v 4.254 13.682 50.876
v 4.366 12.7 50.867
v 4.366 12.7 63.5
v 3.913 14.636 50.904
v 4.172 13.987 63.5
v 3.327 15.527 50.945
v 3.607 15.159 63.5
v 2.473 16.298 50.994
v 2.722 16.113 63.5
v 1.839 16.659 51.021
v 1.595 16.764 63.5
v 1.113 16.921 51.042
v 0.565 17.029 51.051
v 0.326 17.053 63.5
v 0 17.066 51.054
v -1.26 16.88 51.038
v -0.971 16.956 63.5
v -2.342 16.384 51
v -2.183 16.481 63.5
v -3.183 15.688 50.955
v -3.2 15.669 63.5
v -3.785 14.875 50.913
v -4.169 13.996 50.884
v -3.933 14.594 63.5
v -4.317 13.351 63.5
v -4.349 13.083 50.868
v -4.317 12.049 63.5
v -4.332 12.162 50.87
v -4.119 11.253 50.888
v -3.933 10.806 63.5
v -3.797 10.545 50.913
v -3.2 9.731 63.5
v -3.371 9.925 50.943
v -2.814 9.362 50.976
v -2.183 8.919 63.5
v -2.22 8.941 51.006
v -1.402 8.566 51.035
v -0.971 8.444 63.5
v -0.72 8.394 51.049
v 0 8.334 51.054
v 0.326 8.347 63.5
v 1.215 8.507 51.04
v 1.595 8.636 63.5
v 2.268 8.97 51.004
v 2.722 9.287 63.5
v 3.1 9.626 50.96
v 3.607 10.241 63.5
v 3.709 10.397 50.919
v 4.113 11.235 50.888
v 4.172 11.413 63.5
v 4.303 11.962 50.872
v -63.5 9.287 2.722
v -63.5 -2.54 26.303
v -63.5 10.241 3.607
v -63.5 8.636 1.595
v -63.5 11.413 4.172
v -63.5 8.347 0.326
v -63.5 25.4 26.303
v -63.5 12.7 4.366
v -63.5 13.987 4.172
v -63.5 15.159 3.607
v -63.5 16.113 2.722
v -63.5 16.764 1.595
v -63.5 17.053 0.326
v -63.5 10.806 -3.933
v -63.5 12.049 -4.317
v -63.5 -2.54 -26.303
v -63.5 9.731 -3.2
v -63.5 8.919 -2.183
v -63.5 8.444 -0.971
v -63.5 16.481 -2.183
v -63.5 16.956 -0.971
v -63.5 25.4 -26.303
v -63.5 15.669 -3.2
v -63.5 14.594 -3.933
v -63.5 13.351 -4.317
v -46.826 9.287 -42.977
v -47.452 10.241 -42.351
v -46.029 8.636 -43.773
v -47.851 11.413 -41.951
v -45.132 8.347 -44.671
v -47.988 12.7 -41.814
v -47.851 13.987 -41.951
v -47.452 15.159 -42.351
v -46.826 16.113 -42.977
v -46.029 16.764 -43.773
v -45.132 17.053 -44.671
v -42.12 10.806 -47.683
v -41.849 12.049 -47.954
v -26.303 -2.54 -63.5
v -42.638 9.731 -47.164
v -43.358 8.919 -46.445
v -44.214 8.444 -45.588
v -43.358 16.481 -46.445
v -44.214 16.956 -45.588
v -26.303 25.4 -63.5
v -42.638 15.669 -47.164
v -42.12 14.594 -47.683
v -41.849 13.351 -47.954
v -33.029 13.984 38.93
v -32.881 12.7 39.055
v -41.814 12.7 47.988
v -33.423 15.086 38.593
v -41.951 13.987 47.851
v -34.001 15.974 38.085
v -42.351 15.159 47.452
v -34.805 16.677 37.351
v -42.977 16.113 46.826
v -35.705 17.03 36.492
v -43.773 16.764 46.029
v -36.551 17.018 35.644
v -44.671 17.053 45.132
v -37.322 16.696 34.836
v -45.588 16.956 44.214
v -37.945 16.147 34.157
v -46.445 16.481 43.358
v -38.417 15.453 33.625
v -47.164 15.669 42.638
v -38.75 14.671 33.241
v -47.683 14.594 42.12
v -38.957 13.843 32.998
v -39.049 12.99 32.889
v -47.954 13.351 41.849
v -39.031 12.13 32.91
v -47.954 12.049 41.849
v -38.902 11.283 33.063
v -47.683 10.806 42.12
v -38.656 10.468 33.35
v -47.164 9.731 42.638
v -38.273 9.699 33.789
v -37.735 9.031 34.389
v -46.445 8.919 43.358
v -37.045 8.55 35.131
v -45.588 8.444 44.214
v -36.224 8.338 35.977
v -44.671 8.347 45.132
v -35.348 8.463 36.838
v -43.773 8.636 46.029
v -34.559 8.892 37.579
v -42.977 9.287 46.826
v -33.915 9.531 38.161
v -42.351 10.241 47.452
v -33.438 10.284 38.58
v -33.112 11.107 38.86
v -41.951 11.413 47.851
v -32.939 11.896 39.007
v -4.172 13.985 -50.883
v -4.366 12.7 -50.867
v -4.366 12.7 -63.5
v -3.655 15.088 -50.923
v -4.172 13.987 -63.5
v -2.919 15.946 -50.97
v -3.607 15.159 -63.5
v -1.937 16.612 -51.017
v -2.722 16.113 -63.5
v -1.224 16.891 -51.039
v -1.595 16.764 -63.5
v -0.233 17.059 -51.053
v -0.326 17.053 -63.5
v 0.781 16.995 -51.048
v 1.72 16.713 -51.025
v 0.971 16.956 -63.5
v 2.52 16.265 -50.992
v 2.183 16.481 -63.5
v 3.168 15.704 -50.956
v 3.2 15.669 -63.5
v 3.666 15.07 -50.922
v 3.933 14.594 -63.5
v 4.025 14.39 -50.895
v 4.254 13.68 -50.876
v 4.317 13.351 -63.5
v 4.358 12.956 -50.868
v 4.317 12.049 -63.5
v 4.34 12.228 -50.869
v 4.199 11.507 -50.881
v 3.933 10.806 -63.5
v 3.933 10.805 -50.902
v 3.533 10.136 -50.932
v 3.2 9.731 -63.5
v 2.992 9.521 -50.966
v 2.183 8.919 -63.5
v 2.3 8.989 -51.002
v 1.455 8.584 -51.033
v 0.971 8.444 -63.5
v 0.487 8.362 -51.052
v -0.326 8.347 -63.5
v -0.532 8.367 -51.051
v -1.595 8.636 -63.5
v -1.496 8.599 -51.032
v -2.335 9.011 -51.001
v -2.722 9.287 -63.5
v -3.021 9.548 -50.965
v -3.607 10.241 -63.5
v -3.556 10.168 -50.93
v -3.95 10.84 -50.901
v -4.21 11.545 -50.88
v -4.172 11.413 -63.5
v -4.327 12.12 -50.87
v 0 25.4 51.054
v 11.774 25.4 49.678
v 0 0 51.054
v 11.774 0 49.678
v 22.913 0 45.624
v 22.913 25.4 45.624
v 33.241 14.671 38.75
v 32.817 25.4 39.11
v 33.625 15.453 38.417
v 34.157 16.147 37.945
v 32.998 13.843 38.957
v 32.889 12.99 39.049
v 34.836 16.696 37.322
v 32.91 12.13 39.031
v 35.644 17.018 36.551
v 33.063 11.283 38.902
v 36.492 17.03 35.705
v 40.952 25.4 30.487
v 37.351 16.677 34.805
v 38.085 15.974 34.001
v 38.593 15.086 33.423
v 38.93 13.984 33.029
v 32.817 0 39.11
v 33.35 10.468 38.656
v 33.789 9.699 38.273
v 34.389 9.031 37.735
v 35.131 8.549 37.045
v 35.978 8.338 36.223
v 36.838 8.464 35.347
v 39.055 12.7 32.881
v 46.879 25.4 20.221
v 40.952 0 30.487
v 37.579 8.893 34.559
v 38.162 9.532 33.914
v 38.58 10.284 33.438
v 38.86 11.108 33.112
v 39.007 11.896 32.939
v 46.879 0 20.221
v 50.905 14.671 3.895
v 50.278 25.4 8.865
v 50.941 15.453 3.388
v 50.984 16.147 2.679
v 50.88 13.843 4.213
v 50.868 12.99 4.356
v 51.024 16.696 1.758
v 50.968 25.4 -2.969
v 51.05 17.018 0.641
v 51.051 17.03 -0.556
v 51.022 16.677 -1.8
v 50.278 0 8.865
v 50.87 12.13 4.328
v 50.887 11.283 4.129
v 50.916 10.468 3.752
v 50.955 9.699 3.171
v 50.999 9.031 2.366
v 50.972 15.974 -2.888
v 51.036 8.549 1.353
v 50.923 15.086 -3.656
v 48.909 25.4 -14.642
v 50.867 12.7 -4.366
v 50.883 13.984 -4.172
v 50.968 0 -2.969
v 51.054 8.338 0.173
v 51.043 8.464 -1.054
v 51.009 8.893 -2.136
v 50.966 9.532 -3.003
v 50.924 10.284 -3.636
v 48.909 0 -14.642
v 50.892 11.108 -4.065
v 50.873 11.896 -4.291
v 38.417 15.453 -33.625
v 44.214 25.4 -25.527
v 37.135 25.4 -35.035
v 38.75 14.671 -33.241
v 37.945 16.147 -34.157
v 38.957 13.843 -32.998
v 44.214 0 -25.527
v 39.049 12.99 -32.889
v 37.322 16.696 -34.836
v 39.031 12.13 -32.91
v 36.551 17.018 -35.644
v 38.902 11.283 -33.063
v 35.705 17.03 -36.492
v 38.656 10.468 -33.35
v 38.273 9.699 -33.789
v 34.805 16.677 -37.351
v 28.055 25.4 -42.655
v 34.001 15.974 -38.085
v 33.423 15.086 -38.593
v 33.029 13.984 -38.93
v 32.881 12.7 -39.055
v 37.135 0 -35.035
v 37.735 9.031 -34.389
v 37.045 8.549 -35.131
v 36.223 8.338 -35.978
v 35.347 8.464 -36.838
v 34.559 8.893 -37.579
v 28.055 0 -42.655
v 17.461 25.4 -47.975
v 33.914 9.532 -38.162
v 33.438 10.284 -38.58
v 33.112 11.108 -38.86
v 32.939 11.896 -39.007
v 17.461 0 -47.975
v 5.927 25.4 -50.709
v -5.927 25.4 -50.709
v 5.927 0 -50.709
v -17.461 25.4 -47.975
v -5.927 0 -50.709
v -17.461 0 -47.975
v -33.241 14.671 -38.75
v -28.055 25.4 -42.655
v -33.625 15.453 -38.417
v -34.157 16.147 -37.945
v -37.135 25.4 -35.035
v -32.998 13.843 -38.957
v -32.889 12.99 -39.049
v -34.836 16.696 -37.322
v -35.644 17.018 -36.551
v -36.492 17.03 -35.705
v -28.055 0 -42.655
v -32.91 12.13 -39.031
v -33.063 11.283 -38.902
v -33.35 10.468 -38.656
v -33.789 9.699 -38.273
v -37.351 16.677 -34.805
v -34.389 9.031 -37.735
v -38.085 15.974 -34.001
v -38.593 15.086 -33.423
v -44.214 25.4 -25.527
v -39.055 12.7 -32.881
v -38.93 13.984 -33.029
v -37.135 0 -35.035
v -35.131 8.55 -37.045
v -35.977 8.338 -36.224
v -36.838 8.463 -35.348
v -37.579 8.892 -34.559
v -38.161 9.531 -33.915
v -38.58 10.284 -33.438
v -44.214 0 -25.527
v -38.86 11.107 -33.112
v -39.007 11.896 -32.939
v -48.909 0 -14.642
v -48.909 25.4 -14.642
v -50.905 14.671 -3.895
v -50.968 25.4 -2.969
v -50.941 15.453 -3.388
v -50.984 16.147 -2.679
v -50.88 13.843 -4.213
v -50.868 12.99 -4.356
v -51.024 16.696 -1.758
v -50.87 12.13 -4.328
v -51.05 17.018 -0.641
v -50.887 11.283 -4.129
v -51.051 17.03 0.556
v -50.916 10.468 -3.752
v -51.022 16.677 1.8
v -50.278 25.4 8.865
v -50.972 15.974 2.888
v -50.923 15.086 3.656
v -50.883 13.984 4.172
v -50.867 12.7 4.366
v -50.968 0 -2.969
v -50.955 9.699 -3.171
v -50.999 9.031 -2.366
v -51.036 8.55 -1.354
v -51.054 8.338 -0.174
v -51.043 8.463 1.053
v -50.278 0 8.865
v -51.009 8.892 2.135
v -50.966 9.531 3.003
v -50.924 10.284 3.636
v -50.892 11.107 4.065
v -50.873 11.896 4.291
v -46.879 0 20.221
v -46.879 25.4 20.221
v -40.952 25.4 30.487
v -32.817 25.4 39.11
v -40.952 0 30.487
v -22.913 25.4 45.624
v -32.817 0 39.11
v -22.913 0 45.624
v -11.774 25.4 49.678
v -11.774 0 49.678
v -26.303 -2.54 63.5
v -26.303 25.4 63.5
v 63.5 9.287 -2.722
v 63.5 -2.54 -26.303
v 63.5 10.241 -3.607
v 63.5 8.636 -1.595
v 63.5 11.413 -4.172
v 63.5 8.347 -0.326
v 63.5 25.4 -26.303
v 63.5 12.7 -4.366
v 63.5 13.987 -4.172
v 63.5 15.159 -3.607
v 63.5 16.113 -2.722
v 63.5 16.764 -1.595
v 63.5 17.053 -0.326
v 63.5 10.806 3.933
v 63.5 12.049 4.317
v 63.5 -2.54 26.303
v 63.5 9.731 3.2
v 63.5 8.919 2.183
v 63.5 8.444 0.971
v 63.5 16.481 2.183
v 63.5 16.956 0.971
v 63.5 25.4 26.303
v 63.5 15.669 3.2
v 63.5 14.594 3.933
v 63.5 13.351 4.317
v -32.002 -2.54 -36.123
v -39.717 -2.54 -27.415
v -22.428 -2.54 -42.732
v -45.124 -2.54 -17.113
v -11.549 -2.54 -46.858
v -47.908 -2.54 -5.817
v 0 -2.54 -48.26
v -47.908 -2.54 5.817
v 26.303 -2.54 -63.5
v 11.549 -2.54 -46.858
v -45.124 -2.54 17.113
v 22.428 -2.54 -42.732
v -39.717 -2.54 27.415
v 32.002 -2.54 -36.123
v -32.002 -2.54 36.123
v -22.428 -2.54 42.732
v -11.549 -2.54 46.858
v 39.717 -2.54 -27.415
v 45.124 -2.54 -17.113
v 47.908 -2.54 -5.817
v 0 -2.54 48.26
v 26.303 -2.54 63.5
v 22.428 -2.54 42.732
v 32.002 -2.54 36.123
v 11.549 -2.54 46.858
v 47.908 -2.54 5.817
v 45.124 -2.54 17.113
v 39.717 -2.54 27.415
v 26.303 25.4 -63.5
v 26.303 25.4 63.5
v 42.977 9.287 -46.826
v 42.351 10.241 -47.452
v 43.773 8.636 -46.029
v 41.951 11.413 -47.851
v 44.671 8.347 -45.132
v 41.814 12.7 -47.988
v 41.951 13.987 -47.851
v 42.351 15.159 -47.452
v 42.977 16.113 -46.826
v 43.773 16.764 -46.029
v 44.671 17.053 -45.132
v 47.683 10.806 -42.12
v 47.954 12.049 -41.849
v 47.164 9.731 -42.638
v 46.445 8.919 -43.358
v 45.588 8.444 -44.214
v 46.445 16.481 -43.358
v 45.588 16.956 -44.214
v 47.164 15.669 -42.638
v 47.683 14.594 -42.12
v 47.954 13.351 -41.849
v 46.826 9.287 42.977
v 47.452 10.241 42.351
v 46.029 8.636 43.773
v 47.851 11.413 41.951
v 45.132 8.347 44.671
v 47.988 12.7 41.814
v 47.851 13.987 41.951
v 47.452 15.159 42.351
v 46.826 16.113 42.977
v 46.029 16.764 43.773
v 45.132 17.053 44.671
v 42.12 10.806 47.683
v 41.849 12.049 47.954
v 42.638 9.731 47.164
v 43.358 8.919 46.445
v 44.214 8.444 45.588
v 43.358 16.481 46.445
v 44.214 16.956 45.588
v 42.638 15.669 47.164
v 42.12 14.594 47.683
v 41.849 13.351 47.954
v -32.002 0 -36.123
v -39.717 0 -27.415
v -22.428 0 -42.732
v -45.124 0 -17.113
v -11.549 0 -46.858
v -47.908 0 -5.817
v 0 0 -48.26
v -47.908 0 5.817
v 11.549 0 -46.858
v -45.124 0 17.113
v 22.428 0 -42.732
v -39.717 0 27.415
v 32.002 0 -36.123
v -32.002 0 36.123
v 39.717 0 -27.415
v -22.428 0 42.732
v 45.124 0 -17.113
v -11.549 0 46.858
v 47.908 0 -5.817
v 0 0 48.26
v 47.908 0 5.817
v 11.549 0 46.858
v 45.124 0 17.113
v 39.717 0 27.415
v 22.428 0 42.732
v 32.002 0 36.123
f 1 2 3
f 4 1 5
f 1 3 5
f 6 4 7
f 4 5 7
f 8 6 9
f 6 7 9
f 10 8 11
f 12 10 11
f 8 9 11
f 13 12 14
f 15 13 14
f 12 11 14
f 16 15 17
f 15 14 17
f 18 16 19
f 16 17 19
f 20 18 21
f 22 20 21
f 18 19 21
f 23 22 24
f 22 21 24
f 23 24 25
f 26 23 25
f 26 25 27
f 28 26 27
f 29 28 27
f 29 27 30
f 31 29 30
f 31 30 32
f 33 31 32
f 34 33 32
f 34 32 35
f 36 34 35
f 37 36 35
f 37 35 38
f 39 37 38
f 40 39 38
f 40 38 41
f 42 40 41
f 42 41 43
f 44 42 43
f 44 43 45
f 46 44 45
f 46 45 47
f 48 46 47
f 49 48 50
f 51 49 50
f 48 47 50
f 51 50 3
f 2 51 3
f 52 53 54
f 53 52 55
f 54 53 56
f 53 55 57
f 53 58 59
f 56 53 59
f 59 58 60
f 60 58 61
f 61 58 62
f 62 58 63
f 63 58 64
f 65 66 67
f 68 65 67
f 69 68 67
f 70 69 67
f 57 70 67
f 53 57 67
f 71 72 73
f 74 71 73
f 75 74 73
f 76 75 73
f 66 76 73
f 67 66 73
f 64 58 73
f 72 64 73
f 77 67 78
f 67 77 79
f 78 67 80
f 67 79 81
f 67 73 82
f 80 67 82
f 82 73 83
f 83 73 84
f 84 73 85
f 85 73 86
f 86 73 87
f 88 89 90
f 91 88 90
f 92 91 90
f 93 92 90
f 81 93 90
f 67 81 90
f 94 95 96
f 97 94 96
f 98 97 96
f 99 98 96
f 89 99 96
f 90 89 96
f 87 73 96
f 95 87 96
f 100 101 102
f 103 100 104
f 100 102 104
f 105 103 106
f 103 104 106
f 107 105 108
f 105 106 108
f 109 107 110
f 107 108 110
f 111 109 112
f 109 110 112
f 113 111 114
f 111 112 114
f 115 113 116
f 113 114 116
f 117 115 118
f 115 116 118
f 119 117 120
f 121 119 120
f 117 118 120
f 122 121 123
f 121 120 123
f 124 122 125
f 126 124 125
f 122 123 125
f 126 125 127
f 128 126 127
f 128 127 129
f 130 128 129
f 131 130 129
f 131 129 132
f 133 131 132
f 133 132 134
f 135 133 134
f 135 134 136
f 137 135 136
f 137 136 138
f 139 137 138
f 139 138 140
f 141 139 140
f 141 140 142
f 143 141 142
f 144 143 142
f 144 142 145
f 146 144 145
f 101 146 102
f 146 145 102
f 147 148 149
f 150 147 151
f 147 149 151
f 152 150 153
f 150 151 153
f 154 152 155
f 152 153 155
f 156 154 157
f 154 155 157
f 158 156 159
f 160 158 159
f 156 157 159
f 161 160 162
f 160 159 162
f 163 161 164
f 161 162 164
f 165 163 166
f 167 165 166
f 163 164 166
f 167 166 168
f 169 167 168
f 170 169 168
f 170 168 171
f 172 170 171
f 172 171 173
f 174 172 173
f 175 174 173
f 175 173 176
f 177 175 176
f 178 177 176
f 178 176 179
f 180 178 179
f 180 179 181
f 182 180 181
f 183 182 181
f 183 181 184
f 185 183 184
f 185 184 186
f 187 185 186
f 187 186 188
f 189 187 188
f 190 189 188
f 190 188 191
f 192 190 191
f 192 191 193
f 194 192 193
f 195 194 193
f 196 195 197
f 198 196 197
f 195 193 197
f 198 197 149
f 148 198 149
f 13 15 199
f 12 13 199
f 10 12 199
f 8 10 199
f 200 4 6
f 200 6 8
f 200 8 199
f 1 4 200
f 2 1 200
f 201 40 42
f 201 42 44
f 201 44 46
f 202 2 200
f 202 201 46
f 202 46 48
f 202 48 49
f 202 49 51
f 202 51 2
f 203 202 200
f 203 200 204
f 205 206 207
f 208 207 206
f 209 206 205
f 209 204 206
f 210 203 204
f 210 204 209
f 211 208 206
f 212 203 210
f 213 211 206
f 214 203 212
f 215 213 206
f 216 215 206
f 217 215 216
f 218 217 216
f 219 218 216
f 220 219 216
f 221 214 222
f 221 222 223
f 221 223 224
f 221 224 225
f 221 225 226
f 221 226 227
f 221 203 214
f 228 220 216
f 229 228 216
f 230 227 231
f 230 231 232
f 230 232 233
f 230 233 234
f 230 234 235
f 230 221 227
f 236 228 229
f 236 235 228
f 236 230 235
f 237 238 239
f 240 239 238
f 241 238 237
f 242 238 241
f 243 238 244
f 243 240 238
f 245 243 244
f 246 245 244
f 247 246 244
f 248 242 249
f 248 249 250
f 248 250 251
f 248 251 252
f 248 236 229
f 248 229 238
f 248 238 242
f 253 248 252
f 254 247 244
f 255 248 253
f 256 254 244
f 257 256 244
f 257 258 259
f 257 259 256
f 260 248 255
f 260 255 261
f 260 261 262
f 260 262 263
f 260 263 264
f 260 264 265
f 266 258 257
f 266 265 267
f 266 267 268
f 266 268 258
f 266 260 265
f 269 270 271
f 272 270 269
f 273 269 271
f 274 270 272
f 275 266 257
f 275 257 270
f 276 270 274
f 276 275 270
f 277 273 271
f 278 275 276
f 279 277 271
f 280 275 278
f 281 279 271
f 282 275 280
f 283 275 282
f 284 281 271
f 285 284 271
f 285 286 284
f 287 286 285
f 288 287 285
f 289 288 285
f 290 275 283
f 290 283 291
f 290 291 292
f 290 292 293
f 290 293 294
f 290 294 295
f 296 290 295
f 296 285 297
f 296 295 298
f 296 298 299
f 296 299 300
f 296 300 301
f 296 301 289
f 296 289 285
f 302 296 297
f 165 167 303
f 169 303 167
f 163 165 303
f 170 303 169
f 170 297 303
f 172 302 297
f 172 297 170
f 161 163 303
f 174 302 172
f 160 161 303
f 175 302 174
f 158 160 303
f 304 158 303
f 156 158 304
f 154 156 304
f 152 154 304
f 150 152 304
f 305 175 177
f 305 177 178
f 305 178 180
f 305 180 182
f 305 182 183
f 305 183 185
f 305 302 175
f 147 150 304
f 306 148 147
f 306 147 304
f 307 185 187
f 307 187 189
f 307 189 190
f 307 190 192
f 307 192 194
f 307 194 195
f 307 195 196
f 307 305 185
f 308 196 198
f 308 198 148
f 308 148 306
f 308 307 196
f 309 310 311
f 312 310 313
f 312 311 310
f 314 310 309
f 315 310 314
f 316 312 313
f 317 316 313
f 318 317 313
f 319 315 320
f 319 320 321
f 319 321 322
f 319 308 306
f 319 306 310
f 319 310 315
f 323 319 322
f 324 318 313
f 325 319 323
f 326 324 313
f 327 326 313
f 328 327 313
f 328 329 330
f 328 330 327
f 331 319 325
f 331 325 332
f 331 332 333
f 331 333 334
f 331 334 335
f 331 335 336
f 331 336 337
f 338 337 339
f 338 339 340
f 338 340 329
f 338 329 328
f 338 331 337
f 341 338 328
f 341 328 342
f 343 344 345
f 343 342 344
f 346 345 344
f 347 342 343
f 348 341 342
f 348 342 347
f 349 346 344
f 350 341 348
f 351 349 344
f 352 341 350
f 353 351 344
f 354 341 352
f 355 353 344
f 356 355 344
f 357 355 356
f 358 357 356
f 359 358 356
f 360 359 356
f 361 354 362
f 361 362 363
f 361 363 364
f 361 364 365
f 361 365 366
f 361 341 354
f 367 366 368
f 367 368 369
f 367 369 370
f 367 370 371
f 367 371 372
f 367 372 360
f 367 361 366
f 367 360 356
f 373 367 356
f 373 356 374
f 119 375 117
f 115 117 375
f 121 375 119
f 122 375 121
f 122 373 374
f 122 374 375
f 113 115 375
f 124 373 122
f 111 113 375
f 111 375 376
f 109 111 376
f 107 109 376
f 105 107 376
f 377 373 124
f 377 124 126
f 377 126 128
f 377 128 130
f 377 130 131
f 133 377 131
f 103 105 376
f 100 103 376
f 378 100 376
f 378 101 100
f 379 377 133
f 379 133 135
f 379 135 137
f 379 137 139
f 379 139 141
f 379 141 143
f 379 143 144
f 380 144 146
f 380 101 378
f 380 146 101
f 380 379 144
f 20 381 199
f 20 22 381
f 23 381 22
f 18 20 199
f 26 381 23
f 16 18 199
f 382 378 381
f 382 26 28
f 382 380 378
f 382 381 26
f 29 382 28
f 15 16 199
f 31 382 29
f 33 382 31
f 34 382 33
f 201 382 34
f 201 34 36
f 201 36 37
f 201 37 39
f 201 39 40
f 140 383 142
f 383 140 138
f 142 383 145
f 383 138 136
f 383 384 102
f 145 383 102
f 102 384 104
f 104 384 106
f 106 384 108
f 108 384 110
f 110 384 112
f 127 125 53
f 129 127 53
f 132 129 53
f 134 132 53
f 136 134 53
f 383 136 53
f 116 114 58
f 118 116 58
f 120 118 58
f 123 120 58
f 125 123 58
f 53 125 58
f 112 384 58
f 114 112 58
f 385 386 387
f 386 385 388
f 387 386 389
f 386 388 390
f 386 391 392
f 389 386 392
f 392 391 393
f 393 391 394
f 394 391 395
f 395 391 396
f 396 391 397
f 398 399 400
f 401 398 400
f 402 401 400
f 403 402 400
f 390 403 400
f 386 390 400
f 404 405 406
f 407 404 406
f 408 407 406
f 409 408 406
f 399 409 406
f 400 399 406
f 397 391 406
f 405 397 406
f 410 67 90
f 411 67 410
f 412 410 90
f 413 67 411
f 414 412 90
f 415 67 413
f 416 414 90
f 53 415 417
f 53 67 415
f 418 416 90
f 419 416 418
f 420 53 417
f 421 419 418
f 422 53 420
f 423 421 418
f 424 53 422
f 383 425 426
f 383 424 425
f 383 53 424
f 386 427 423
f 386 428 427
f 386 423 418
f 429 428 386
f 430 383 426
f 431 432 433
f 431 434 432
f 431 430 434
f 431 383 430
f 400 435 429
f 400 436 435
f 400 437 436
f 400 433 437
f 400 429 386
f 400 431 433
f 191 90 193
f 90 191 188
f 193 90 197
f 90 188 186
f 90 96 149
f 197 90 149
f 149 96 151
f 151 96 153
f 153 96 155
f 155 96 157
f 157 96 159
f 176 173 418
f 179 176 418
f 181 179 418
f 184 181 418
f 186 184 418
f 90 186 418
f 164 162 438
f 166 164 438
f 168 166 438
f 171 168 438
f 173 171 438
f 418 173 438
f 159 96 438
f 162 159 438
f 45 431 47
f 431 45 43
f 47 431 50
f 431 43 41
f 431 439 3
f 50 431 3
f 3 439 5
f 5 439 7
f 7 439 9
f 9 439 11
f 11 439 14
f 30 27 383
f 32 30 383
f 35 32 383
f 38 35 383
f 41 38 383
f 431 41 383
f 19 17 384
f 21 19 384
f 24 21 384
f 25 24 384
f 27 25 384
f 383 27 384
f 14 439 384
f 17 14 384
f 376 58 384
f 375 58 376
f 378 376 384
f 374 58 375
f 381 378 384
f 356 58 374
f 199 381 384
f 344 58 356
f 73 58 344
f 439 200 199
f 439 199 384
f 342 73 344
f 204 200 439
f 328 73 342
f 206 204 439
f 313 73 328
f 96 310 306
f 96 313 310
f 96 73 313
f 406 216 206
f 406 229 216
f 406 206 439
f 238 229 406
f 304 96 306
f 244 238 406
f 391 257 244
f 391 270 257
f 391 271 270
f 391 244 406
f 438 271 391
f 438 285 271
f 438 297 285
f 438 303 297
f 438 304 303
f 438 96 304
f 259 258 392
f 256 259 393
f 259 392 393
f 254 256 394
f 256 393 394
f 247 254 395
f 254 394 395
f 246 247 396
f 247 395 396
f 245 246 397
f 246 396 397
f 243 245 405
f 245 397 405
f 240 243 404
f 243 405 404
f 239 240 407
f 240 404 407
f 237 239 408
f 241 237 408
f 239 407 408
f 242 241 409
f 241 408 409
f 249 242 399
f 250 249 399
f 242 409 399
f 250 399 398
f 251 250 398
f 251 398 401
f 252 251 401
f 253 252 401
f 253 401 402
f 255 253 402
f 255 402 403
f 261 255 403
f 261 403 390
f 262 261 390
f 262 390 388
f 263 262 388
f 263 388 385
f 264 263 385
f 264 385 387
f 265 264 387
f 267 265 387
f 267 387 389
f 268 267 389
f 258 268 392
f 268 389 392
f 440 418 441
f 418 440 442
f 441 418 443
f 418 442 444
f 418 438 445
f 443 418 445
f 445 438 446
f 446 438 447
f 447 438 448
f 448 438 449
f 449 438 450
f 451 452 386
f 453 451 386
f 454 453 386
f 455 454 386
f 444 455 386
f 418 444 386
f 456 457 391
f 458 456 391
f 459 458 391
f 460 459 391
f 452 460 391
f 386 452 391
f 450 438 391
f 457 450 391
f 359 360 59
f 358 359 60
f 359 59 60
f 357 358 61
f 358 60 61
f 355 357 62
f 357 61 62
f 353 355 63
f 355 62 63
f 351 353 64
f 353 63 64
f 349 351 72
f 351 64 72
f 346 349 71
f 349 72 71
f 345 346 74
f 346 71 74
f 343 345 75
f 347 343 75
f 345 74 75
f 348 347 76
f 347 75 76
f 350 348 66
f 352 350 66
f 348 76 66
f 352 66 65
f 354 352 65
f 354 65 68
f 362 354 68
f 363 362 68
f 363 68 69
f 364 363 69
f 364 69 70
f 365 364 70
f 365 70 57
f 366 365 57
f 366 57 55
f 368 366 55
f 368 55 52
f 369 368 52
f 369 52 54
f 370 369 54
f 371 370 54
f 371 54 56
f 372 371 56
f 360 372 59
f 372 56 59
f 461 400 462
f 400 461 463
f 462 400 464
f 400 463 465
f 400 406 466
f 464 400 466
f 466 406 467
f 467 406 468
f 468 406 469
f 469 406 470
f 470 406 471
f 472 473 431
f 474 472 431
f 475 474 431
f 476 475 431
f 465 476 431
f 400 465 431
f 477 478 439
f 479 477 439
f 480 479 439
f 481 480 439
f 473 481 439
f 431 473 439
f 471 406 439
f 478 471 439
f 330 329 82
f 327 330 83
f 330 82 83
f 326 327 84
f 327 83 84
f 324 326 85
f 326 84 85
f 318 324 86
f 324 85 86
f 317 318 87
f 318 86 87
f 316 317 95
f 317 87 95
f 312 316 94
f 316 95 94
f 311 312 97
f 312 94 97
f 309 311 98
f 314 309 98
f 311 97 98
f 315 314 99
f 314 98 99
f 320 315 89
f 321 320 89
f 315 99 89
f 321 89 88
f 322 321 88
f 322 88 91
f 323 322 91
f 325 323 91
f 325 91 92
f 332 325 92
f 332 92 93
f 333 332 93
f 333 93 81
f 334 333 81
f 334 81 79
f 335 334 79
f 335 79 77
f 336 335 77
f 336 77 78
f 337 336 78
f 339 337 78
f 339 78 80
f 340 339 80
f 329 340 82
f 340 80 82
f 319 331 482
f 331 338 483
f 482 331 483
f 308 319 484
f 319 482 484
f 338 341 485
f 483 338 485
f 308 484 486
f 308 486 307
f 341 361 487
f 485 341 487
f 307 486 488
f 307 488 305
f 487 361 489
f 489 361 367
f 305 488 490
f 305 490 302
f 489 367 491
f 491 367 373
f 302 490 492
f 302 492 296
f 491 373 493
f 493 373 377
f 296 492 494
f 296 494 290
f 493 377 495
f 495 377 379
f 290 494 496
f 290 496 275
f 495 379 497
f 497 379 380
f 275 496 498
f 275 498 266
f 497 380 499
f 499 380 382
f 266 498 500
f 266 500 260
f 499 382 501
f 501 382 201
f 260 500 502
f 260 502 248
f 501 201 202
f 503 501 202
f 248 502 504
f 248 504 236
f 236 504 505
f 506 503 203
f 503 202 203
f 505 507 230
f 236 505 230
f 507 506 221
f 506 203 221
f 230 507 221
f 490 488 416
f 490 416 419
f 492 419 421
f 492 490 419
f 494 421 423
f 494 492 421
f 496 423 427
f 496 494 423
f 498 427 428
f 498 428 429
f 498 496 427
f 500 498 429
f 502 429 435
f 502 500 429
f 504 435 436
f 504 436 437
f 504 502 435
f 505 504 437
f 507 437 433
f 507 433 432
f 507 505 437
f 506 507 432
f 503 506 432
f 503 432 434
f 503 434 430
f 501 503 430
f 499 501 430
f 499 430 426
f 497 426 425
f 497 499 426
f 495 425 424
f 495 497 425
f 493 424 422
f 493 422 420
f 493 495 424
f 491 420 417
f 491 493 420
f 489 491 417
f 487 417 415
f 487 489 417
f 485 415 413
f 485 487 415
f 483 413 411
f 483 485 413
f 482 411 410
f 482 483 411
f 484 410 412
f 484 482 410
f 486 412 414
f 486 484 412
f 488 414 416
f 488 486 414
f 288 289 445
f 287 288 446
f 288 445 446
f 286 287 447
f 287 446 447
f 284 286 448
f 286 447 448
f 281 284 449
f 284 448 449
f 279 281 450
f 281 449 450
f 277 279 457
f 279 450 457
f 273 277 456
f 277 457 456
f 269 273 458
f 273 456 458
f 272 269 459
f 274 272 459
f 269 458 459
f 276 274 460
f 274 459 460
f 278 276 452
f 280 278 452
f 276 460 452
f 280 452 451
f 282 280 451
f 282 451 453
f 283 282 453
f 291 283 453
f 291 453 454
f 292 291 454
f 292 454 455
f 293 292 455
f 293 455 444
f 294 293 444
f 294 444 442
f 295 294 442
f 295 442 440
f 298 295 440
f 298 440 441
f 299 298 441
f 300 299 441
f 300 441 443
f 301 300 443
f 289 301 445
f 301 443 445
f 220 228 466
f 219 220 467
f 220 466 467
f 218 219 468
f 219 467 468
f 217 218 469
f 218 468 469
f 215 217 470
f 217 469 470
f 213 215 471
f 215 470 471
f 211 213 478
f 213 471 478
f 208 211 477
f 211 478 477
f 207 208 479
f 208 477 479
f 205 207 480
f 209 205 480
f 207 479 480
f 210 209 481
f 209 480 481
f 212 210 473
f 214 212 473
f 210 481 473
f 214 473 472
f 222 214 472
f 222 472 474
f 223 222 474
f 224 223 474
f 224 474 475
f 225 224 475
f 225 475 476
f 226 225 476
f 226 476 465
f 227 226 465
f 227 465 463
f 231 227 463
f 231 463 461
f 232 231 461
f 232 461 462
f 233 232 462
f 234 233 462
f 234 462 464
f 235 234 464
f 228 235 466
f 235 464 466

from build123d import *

# Parameters (mm, degrees)
SKETCH1_R           = 51.054
BOSS_EXTRUDE1_DEPTH = 25.4
SKETCH2_R           = 4.365625
CUT_EXTRUDE1_DEPTH  = 31.75
CIRPATTERN1_COUNT   = 8
SKETCH3_R           = 48.26
BOSS_EXTRUDE2_DEPTH = 2.54


with BuildPart() as part:
    # Sketch1 → Boss-Extrude1 (new body)
    with BuildSketch(Plane(origin=(0, 0, 0), x_dir=(1, 0, 0), z_dir=(0, 1, 0))):
        Polygon((63.5, 26.302561211), (26.302561211, 63.5), (-26.302561211, 63.5), (-63.5, 26.302561211), (-63.5, -26.302561211), (-26.302561211, -63.5), (26.302561211, -63.5), (63.5, -26.302561211), align=None)
        with Locations(Location((0, 0, 0), (0, 0, 270))):
            Circle(SKETCH1_R, mode=Mode.SUBTRACT)
    extrude(amount=BOSS_EXTRUDE1_DEPTH)

    # Sketch2 → Cut-Extrude1 (cut)
    with BuildSketch(Plane(origin=(63.5, 0, 0), x_dir=(0, 0, -1), z_dir=(1, 0, 0))):
        with Locations((0, 12.7)):
            Circle(SKETCH2_R)
    cut_extrude1 = extrude(amount=-CUT_EXTRUDE1_DEPTH, mode=Mode.SUBTRACT)

    # CirPattern1: Cut-Extrude1 ×8 about axis
    cirpattern1_axis = Axis((0, 25.4, 0), (0, -1, 0))
    for i in range(1, CIRPATTERN1_COUNT):
        add(cut_extrude1.rotate(cirpattern1_axis, i * 360 / CIRPATTERN1_COUNT), mode=Mode.SUBTRACT)

    # Sketch3 → Boss-Extrude2 (add)
    with BuildSketch(Plane.XZ):
        Polygon((26.302561211, 63.5), (-26.302561211, 63.5), (-63.5, 26.302561211), (-63.5, -26.302561211), (-26.302561211, -63.5), (26.302561211, -63.5), (63.5, -26.302561211), (63.5, 26.302561211), align=None)
        with Locations(Location((0, 0, 0), (0, 0, 270))):
            Circle(SKETCH3_R, mode=Mode.SUBTRACT)
    extrude(amount=BOSS_EXTRUDE2_DEPTH)


solid = part.part
